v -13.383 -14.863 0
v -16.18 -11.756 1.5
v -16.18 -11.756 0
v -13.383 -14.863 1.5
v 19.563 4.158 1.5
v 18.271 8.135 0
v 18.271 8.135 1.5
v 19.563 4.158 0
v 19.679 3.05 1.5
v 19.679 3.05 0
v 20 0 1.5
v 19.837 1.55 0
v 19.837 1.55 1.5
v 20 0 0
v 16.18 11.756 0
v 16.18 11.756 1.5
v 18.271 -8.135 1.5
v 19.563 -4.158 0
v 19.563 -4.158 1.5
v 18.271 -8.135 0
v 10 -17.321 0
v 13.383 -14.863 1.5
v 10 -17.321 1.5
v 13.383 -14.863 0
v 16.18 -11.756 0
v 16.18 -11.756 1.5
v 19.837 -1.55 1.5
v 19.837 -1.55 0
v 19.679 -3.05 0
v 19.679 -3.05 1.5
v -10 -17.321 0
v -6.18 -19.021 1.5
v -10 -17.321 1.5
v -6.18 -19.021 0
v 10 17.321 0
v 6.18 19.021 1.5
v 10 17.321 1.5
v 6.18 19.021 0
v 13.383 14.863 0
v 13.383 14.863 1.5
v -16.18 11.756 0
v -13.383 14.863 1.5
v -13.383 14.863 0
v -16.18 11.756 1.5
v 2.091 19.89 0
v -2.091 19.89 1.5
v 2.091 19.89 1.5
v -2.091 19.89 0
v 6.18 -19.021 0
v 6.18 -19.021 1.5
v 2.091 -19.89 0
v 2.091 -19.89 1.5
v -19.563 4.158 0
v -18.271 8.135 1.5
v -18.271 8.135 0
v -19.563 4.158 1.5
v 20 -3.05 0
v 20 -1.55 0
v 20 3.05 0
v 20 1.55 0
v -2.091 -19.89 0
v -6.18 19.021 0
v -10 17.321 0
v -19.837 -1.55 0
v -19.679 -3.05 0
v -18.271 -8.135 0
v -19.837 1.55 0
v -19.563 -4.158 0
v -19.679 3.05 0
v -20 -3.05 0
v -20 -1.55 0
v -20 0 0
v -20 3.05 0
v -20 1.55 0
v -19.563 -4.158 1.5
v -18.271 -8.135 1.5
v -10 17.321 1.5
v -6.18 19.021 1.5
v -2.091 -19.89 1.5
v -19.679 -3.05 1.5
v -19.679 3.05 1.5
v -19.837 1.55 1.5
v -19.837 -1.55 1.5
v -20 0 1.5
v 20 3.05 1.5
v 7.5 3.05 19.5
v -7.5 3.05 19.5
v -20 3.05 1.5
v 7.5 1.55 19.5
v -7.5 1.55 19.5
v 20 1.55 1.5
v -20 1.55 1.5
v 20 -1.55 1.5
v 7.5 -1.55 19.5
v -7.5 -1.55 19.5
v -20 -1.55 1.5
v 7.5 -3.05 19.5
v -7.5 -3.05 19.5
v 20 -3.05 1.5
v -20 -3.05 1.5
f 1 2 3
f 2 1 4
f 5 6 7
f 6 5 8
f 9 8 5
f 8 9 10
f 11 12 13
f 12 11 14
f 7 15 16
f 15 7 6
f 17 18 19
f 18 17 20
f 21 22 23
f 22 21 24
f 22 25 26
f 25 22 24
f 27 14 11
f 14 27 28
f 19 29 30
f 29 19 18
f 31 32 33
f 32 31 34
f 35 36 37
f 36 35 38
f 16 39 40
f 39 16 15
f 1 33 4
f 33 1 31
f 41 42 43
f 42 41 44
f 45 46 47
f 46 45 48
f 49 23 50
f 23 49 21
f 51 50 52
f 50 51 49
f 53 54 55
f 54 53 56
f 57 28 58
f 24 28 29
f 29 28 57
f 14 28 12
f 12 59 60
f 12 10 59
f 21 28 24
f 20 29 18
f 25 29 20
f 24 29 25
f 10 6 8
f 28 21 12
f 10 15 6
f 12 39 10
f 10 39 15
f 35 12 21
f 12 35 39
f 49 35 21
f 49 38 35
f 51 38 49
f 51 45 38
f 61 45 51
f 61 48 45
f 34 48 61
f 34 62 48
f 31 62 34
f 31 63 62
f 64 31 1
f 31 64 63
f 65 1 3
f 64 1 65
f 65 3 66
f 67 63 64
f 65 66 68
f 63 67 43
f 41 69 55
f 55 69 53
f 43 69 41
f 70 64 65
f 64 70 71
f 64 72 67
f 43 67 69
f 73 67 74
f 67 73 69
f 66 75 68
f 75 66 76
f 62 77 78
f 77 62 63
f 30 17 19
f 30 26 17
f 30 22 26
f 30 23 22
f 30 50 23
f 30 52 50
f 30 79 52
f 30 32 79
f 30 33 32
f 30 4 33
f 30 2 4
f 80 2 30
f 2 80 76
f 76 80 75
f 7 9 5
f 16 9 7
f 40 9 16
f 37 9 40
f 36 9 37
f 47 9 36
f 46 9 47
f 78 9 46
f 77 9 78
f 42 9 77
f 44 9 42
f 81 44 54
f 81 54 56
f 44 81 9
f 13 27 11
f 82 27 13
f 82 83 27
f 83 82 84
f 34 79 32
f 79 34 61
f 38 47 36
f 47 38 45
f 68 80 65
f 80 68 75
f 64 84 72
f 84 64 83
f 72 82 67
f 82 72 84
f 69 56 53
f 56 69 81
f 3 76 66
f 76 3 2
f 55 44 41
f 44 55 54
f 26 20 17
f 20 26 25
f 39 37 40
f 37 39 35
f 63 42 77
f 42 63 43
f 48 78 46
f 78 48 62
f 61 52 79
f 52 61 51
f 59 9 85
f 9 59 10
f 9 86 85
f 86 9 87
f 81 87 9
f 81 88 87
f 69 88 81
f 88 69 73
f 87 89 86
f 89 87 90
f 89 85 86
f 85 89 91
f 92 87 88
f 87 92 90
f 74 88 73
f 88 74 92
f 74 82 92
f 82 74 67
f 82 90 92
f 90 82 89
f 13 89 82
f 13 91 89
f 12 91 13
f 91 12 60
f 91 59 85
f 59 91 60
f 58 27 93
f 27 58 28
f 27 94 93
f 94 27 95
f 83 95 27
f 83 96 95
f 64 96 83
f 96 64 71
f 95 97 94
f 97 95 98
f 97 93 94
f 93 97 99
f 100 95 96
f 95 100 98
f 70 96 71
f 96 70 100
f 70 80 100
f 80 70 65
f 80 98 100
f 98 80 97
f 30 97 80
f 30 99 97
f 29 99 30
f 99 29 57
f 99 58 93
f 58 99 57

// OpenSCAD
baseDiameter = 40;
thickness = 1.5;
innerSpace = 3.1;
height = 18;
topWidth = 15;


module vertical() {
    hull() {
        translate([-baseDiameter/2,-thickness/2,0]) cube([thickness,thickness,thickness]);
        translate([baseDiameter/2-thickness,-thickness/2,0]) cube([thickness,thickness,thickness]);
        translate([-topWidth/2,-thickness/2,height]) cube([thickness,thickness,thickness]);
        translate([topWidth/2-thickness,-thickness/2,height]) cube([thickness,thickness,thickness]);
    }
    
}
cylinder(d=baseDiameter,h=thickness);
translate([0,thickness/2+innerSpace/2,0])
vertical();
translate([0,-thickness/2-innerSpace/2,0])
vertical();
